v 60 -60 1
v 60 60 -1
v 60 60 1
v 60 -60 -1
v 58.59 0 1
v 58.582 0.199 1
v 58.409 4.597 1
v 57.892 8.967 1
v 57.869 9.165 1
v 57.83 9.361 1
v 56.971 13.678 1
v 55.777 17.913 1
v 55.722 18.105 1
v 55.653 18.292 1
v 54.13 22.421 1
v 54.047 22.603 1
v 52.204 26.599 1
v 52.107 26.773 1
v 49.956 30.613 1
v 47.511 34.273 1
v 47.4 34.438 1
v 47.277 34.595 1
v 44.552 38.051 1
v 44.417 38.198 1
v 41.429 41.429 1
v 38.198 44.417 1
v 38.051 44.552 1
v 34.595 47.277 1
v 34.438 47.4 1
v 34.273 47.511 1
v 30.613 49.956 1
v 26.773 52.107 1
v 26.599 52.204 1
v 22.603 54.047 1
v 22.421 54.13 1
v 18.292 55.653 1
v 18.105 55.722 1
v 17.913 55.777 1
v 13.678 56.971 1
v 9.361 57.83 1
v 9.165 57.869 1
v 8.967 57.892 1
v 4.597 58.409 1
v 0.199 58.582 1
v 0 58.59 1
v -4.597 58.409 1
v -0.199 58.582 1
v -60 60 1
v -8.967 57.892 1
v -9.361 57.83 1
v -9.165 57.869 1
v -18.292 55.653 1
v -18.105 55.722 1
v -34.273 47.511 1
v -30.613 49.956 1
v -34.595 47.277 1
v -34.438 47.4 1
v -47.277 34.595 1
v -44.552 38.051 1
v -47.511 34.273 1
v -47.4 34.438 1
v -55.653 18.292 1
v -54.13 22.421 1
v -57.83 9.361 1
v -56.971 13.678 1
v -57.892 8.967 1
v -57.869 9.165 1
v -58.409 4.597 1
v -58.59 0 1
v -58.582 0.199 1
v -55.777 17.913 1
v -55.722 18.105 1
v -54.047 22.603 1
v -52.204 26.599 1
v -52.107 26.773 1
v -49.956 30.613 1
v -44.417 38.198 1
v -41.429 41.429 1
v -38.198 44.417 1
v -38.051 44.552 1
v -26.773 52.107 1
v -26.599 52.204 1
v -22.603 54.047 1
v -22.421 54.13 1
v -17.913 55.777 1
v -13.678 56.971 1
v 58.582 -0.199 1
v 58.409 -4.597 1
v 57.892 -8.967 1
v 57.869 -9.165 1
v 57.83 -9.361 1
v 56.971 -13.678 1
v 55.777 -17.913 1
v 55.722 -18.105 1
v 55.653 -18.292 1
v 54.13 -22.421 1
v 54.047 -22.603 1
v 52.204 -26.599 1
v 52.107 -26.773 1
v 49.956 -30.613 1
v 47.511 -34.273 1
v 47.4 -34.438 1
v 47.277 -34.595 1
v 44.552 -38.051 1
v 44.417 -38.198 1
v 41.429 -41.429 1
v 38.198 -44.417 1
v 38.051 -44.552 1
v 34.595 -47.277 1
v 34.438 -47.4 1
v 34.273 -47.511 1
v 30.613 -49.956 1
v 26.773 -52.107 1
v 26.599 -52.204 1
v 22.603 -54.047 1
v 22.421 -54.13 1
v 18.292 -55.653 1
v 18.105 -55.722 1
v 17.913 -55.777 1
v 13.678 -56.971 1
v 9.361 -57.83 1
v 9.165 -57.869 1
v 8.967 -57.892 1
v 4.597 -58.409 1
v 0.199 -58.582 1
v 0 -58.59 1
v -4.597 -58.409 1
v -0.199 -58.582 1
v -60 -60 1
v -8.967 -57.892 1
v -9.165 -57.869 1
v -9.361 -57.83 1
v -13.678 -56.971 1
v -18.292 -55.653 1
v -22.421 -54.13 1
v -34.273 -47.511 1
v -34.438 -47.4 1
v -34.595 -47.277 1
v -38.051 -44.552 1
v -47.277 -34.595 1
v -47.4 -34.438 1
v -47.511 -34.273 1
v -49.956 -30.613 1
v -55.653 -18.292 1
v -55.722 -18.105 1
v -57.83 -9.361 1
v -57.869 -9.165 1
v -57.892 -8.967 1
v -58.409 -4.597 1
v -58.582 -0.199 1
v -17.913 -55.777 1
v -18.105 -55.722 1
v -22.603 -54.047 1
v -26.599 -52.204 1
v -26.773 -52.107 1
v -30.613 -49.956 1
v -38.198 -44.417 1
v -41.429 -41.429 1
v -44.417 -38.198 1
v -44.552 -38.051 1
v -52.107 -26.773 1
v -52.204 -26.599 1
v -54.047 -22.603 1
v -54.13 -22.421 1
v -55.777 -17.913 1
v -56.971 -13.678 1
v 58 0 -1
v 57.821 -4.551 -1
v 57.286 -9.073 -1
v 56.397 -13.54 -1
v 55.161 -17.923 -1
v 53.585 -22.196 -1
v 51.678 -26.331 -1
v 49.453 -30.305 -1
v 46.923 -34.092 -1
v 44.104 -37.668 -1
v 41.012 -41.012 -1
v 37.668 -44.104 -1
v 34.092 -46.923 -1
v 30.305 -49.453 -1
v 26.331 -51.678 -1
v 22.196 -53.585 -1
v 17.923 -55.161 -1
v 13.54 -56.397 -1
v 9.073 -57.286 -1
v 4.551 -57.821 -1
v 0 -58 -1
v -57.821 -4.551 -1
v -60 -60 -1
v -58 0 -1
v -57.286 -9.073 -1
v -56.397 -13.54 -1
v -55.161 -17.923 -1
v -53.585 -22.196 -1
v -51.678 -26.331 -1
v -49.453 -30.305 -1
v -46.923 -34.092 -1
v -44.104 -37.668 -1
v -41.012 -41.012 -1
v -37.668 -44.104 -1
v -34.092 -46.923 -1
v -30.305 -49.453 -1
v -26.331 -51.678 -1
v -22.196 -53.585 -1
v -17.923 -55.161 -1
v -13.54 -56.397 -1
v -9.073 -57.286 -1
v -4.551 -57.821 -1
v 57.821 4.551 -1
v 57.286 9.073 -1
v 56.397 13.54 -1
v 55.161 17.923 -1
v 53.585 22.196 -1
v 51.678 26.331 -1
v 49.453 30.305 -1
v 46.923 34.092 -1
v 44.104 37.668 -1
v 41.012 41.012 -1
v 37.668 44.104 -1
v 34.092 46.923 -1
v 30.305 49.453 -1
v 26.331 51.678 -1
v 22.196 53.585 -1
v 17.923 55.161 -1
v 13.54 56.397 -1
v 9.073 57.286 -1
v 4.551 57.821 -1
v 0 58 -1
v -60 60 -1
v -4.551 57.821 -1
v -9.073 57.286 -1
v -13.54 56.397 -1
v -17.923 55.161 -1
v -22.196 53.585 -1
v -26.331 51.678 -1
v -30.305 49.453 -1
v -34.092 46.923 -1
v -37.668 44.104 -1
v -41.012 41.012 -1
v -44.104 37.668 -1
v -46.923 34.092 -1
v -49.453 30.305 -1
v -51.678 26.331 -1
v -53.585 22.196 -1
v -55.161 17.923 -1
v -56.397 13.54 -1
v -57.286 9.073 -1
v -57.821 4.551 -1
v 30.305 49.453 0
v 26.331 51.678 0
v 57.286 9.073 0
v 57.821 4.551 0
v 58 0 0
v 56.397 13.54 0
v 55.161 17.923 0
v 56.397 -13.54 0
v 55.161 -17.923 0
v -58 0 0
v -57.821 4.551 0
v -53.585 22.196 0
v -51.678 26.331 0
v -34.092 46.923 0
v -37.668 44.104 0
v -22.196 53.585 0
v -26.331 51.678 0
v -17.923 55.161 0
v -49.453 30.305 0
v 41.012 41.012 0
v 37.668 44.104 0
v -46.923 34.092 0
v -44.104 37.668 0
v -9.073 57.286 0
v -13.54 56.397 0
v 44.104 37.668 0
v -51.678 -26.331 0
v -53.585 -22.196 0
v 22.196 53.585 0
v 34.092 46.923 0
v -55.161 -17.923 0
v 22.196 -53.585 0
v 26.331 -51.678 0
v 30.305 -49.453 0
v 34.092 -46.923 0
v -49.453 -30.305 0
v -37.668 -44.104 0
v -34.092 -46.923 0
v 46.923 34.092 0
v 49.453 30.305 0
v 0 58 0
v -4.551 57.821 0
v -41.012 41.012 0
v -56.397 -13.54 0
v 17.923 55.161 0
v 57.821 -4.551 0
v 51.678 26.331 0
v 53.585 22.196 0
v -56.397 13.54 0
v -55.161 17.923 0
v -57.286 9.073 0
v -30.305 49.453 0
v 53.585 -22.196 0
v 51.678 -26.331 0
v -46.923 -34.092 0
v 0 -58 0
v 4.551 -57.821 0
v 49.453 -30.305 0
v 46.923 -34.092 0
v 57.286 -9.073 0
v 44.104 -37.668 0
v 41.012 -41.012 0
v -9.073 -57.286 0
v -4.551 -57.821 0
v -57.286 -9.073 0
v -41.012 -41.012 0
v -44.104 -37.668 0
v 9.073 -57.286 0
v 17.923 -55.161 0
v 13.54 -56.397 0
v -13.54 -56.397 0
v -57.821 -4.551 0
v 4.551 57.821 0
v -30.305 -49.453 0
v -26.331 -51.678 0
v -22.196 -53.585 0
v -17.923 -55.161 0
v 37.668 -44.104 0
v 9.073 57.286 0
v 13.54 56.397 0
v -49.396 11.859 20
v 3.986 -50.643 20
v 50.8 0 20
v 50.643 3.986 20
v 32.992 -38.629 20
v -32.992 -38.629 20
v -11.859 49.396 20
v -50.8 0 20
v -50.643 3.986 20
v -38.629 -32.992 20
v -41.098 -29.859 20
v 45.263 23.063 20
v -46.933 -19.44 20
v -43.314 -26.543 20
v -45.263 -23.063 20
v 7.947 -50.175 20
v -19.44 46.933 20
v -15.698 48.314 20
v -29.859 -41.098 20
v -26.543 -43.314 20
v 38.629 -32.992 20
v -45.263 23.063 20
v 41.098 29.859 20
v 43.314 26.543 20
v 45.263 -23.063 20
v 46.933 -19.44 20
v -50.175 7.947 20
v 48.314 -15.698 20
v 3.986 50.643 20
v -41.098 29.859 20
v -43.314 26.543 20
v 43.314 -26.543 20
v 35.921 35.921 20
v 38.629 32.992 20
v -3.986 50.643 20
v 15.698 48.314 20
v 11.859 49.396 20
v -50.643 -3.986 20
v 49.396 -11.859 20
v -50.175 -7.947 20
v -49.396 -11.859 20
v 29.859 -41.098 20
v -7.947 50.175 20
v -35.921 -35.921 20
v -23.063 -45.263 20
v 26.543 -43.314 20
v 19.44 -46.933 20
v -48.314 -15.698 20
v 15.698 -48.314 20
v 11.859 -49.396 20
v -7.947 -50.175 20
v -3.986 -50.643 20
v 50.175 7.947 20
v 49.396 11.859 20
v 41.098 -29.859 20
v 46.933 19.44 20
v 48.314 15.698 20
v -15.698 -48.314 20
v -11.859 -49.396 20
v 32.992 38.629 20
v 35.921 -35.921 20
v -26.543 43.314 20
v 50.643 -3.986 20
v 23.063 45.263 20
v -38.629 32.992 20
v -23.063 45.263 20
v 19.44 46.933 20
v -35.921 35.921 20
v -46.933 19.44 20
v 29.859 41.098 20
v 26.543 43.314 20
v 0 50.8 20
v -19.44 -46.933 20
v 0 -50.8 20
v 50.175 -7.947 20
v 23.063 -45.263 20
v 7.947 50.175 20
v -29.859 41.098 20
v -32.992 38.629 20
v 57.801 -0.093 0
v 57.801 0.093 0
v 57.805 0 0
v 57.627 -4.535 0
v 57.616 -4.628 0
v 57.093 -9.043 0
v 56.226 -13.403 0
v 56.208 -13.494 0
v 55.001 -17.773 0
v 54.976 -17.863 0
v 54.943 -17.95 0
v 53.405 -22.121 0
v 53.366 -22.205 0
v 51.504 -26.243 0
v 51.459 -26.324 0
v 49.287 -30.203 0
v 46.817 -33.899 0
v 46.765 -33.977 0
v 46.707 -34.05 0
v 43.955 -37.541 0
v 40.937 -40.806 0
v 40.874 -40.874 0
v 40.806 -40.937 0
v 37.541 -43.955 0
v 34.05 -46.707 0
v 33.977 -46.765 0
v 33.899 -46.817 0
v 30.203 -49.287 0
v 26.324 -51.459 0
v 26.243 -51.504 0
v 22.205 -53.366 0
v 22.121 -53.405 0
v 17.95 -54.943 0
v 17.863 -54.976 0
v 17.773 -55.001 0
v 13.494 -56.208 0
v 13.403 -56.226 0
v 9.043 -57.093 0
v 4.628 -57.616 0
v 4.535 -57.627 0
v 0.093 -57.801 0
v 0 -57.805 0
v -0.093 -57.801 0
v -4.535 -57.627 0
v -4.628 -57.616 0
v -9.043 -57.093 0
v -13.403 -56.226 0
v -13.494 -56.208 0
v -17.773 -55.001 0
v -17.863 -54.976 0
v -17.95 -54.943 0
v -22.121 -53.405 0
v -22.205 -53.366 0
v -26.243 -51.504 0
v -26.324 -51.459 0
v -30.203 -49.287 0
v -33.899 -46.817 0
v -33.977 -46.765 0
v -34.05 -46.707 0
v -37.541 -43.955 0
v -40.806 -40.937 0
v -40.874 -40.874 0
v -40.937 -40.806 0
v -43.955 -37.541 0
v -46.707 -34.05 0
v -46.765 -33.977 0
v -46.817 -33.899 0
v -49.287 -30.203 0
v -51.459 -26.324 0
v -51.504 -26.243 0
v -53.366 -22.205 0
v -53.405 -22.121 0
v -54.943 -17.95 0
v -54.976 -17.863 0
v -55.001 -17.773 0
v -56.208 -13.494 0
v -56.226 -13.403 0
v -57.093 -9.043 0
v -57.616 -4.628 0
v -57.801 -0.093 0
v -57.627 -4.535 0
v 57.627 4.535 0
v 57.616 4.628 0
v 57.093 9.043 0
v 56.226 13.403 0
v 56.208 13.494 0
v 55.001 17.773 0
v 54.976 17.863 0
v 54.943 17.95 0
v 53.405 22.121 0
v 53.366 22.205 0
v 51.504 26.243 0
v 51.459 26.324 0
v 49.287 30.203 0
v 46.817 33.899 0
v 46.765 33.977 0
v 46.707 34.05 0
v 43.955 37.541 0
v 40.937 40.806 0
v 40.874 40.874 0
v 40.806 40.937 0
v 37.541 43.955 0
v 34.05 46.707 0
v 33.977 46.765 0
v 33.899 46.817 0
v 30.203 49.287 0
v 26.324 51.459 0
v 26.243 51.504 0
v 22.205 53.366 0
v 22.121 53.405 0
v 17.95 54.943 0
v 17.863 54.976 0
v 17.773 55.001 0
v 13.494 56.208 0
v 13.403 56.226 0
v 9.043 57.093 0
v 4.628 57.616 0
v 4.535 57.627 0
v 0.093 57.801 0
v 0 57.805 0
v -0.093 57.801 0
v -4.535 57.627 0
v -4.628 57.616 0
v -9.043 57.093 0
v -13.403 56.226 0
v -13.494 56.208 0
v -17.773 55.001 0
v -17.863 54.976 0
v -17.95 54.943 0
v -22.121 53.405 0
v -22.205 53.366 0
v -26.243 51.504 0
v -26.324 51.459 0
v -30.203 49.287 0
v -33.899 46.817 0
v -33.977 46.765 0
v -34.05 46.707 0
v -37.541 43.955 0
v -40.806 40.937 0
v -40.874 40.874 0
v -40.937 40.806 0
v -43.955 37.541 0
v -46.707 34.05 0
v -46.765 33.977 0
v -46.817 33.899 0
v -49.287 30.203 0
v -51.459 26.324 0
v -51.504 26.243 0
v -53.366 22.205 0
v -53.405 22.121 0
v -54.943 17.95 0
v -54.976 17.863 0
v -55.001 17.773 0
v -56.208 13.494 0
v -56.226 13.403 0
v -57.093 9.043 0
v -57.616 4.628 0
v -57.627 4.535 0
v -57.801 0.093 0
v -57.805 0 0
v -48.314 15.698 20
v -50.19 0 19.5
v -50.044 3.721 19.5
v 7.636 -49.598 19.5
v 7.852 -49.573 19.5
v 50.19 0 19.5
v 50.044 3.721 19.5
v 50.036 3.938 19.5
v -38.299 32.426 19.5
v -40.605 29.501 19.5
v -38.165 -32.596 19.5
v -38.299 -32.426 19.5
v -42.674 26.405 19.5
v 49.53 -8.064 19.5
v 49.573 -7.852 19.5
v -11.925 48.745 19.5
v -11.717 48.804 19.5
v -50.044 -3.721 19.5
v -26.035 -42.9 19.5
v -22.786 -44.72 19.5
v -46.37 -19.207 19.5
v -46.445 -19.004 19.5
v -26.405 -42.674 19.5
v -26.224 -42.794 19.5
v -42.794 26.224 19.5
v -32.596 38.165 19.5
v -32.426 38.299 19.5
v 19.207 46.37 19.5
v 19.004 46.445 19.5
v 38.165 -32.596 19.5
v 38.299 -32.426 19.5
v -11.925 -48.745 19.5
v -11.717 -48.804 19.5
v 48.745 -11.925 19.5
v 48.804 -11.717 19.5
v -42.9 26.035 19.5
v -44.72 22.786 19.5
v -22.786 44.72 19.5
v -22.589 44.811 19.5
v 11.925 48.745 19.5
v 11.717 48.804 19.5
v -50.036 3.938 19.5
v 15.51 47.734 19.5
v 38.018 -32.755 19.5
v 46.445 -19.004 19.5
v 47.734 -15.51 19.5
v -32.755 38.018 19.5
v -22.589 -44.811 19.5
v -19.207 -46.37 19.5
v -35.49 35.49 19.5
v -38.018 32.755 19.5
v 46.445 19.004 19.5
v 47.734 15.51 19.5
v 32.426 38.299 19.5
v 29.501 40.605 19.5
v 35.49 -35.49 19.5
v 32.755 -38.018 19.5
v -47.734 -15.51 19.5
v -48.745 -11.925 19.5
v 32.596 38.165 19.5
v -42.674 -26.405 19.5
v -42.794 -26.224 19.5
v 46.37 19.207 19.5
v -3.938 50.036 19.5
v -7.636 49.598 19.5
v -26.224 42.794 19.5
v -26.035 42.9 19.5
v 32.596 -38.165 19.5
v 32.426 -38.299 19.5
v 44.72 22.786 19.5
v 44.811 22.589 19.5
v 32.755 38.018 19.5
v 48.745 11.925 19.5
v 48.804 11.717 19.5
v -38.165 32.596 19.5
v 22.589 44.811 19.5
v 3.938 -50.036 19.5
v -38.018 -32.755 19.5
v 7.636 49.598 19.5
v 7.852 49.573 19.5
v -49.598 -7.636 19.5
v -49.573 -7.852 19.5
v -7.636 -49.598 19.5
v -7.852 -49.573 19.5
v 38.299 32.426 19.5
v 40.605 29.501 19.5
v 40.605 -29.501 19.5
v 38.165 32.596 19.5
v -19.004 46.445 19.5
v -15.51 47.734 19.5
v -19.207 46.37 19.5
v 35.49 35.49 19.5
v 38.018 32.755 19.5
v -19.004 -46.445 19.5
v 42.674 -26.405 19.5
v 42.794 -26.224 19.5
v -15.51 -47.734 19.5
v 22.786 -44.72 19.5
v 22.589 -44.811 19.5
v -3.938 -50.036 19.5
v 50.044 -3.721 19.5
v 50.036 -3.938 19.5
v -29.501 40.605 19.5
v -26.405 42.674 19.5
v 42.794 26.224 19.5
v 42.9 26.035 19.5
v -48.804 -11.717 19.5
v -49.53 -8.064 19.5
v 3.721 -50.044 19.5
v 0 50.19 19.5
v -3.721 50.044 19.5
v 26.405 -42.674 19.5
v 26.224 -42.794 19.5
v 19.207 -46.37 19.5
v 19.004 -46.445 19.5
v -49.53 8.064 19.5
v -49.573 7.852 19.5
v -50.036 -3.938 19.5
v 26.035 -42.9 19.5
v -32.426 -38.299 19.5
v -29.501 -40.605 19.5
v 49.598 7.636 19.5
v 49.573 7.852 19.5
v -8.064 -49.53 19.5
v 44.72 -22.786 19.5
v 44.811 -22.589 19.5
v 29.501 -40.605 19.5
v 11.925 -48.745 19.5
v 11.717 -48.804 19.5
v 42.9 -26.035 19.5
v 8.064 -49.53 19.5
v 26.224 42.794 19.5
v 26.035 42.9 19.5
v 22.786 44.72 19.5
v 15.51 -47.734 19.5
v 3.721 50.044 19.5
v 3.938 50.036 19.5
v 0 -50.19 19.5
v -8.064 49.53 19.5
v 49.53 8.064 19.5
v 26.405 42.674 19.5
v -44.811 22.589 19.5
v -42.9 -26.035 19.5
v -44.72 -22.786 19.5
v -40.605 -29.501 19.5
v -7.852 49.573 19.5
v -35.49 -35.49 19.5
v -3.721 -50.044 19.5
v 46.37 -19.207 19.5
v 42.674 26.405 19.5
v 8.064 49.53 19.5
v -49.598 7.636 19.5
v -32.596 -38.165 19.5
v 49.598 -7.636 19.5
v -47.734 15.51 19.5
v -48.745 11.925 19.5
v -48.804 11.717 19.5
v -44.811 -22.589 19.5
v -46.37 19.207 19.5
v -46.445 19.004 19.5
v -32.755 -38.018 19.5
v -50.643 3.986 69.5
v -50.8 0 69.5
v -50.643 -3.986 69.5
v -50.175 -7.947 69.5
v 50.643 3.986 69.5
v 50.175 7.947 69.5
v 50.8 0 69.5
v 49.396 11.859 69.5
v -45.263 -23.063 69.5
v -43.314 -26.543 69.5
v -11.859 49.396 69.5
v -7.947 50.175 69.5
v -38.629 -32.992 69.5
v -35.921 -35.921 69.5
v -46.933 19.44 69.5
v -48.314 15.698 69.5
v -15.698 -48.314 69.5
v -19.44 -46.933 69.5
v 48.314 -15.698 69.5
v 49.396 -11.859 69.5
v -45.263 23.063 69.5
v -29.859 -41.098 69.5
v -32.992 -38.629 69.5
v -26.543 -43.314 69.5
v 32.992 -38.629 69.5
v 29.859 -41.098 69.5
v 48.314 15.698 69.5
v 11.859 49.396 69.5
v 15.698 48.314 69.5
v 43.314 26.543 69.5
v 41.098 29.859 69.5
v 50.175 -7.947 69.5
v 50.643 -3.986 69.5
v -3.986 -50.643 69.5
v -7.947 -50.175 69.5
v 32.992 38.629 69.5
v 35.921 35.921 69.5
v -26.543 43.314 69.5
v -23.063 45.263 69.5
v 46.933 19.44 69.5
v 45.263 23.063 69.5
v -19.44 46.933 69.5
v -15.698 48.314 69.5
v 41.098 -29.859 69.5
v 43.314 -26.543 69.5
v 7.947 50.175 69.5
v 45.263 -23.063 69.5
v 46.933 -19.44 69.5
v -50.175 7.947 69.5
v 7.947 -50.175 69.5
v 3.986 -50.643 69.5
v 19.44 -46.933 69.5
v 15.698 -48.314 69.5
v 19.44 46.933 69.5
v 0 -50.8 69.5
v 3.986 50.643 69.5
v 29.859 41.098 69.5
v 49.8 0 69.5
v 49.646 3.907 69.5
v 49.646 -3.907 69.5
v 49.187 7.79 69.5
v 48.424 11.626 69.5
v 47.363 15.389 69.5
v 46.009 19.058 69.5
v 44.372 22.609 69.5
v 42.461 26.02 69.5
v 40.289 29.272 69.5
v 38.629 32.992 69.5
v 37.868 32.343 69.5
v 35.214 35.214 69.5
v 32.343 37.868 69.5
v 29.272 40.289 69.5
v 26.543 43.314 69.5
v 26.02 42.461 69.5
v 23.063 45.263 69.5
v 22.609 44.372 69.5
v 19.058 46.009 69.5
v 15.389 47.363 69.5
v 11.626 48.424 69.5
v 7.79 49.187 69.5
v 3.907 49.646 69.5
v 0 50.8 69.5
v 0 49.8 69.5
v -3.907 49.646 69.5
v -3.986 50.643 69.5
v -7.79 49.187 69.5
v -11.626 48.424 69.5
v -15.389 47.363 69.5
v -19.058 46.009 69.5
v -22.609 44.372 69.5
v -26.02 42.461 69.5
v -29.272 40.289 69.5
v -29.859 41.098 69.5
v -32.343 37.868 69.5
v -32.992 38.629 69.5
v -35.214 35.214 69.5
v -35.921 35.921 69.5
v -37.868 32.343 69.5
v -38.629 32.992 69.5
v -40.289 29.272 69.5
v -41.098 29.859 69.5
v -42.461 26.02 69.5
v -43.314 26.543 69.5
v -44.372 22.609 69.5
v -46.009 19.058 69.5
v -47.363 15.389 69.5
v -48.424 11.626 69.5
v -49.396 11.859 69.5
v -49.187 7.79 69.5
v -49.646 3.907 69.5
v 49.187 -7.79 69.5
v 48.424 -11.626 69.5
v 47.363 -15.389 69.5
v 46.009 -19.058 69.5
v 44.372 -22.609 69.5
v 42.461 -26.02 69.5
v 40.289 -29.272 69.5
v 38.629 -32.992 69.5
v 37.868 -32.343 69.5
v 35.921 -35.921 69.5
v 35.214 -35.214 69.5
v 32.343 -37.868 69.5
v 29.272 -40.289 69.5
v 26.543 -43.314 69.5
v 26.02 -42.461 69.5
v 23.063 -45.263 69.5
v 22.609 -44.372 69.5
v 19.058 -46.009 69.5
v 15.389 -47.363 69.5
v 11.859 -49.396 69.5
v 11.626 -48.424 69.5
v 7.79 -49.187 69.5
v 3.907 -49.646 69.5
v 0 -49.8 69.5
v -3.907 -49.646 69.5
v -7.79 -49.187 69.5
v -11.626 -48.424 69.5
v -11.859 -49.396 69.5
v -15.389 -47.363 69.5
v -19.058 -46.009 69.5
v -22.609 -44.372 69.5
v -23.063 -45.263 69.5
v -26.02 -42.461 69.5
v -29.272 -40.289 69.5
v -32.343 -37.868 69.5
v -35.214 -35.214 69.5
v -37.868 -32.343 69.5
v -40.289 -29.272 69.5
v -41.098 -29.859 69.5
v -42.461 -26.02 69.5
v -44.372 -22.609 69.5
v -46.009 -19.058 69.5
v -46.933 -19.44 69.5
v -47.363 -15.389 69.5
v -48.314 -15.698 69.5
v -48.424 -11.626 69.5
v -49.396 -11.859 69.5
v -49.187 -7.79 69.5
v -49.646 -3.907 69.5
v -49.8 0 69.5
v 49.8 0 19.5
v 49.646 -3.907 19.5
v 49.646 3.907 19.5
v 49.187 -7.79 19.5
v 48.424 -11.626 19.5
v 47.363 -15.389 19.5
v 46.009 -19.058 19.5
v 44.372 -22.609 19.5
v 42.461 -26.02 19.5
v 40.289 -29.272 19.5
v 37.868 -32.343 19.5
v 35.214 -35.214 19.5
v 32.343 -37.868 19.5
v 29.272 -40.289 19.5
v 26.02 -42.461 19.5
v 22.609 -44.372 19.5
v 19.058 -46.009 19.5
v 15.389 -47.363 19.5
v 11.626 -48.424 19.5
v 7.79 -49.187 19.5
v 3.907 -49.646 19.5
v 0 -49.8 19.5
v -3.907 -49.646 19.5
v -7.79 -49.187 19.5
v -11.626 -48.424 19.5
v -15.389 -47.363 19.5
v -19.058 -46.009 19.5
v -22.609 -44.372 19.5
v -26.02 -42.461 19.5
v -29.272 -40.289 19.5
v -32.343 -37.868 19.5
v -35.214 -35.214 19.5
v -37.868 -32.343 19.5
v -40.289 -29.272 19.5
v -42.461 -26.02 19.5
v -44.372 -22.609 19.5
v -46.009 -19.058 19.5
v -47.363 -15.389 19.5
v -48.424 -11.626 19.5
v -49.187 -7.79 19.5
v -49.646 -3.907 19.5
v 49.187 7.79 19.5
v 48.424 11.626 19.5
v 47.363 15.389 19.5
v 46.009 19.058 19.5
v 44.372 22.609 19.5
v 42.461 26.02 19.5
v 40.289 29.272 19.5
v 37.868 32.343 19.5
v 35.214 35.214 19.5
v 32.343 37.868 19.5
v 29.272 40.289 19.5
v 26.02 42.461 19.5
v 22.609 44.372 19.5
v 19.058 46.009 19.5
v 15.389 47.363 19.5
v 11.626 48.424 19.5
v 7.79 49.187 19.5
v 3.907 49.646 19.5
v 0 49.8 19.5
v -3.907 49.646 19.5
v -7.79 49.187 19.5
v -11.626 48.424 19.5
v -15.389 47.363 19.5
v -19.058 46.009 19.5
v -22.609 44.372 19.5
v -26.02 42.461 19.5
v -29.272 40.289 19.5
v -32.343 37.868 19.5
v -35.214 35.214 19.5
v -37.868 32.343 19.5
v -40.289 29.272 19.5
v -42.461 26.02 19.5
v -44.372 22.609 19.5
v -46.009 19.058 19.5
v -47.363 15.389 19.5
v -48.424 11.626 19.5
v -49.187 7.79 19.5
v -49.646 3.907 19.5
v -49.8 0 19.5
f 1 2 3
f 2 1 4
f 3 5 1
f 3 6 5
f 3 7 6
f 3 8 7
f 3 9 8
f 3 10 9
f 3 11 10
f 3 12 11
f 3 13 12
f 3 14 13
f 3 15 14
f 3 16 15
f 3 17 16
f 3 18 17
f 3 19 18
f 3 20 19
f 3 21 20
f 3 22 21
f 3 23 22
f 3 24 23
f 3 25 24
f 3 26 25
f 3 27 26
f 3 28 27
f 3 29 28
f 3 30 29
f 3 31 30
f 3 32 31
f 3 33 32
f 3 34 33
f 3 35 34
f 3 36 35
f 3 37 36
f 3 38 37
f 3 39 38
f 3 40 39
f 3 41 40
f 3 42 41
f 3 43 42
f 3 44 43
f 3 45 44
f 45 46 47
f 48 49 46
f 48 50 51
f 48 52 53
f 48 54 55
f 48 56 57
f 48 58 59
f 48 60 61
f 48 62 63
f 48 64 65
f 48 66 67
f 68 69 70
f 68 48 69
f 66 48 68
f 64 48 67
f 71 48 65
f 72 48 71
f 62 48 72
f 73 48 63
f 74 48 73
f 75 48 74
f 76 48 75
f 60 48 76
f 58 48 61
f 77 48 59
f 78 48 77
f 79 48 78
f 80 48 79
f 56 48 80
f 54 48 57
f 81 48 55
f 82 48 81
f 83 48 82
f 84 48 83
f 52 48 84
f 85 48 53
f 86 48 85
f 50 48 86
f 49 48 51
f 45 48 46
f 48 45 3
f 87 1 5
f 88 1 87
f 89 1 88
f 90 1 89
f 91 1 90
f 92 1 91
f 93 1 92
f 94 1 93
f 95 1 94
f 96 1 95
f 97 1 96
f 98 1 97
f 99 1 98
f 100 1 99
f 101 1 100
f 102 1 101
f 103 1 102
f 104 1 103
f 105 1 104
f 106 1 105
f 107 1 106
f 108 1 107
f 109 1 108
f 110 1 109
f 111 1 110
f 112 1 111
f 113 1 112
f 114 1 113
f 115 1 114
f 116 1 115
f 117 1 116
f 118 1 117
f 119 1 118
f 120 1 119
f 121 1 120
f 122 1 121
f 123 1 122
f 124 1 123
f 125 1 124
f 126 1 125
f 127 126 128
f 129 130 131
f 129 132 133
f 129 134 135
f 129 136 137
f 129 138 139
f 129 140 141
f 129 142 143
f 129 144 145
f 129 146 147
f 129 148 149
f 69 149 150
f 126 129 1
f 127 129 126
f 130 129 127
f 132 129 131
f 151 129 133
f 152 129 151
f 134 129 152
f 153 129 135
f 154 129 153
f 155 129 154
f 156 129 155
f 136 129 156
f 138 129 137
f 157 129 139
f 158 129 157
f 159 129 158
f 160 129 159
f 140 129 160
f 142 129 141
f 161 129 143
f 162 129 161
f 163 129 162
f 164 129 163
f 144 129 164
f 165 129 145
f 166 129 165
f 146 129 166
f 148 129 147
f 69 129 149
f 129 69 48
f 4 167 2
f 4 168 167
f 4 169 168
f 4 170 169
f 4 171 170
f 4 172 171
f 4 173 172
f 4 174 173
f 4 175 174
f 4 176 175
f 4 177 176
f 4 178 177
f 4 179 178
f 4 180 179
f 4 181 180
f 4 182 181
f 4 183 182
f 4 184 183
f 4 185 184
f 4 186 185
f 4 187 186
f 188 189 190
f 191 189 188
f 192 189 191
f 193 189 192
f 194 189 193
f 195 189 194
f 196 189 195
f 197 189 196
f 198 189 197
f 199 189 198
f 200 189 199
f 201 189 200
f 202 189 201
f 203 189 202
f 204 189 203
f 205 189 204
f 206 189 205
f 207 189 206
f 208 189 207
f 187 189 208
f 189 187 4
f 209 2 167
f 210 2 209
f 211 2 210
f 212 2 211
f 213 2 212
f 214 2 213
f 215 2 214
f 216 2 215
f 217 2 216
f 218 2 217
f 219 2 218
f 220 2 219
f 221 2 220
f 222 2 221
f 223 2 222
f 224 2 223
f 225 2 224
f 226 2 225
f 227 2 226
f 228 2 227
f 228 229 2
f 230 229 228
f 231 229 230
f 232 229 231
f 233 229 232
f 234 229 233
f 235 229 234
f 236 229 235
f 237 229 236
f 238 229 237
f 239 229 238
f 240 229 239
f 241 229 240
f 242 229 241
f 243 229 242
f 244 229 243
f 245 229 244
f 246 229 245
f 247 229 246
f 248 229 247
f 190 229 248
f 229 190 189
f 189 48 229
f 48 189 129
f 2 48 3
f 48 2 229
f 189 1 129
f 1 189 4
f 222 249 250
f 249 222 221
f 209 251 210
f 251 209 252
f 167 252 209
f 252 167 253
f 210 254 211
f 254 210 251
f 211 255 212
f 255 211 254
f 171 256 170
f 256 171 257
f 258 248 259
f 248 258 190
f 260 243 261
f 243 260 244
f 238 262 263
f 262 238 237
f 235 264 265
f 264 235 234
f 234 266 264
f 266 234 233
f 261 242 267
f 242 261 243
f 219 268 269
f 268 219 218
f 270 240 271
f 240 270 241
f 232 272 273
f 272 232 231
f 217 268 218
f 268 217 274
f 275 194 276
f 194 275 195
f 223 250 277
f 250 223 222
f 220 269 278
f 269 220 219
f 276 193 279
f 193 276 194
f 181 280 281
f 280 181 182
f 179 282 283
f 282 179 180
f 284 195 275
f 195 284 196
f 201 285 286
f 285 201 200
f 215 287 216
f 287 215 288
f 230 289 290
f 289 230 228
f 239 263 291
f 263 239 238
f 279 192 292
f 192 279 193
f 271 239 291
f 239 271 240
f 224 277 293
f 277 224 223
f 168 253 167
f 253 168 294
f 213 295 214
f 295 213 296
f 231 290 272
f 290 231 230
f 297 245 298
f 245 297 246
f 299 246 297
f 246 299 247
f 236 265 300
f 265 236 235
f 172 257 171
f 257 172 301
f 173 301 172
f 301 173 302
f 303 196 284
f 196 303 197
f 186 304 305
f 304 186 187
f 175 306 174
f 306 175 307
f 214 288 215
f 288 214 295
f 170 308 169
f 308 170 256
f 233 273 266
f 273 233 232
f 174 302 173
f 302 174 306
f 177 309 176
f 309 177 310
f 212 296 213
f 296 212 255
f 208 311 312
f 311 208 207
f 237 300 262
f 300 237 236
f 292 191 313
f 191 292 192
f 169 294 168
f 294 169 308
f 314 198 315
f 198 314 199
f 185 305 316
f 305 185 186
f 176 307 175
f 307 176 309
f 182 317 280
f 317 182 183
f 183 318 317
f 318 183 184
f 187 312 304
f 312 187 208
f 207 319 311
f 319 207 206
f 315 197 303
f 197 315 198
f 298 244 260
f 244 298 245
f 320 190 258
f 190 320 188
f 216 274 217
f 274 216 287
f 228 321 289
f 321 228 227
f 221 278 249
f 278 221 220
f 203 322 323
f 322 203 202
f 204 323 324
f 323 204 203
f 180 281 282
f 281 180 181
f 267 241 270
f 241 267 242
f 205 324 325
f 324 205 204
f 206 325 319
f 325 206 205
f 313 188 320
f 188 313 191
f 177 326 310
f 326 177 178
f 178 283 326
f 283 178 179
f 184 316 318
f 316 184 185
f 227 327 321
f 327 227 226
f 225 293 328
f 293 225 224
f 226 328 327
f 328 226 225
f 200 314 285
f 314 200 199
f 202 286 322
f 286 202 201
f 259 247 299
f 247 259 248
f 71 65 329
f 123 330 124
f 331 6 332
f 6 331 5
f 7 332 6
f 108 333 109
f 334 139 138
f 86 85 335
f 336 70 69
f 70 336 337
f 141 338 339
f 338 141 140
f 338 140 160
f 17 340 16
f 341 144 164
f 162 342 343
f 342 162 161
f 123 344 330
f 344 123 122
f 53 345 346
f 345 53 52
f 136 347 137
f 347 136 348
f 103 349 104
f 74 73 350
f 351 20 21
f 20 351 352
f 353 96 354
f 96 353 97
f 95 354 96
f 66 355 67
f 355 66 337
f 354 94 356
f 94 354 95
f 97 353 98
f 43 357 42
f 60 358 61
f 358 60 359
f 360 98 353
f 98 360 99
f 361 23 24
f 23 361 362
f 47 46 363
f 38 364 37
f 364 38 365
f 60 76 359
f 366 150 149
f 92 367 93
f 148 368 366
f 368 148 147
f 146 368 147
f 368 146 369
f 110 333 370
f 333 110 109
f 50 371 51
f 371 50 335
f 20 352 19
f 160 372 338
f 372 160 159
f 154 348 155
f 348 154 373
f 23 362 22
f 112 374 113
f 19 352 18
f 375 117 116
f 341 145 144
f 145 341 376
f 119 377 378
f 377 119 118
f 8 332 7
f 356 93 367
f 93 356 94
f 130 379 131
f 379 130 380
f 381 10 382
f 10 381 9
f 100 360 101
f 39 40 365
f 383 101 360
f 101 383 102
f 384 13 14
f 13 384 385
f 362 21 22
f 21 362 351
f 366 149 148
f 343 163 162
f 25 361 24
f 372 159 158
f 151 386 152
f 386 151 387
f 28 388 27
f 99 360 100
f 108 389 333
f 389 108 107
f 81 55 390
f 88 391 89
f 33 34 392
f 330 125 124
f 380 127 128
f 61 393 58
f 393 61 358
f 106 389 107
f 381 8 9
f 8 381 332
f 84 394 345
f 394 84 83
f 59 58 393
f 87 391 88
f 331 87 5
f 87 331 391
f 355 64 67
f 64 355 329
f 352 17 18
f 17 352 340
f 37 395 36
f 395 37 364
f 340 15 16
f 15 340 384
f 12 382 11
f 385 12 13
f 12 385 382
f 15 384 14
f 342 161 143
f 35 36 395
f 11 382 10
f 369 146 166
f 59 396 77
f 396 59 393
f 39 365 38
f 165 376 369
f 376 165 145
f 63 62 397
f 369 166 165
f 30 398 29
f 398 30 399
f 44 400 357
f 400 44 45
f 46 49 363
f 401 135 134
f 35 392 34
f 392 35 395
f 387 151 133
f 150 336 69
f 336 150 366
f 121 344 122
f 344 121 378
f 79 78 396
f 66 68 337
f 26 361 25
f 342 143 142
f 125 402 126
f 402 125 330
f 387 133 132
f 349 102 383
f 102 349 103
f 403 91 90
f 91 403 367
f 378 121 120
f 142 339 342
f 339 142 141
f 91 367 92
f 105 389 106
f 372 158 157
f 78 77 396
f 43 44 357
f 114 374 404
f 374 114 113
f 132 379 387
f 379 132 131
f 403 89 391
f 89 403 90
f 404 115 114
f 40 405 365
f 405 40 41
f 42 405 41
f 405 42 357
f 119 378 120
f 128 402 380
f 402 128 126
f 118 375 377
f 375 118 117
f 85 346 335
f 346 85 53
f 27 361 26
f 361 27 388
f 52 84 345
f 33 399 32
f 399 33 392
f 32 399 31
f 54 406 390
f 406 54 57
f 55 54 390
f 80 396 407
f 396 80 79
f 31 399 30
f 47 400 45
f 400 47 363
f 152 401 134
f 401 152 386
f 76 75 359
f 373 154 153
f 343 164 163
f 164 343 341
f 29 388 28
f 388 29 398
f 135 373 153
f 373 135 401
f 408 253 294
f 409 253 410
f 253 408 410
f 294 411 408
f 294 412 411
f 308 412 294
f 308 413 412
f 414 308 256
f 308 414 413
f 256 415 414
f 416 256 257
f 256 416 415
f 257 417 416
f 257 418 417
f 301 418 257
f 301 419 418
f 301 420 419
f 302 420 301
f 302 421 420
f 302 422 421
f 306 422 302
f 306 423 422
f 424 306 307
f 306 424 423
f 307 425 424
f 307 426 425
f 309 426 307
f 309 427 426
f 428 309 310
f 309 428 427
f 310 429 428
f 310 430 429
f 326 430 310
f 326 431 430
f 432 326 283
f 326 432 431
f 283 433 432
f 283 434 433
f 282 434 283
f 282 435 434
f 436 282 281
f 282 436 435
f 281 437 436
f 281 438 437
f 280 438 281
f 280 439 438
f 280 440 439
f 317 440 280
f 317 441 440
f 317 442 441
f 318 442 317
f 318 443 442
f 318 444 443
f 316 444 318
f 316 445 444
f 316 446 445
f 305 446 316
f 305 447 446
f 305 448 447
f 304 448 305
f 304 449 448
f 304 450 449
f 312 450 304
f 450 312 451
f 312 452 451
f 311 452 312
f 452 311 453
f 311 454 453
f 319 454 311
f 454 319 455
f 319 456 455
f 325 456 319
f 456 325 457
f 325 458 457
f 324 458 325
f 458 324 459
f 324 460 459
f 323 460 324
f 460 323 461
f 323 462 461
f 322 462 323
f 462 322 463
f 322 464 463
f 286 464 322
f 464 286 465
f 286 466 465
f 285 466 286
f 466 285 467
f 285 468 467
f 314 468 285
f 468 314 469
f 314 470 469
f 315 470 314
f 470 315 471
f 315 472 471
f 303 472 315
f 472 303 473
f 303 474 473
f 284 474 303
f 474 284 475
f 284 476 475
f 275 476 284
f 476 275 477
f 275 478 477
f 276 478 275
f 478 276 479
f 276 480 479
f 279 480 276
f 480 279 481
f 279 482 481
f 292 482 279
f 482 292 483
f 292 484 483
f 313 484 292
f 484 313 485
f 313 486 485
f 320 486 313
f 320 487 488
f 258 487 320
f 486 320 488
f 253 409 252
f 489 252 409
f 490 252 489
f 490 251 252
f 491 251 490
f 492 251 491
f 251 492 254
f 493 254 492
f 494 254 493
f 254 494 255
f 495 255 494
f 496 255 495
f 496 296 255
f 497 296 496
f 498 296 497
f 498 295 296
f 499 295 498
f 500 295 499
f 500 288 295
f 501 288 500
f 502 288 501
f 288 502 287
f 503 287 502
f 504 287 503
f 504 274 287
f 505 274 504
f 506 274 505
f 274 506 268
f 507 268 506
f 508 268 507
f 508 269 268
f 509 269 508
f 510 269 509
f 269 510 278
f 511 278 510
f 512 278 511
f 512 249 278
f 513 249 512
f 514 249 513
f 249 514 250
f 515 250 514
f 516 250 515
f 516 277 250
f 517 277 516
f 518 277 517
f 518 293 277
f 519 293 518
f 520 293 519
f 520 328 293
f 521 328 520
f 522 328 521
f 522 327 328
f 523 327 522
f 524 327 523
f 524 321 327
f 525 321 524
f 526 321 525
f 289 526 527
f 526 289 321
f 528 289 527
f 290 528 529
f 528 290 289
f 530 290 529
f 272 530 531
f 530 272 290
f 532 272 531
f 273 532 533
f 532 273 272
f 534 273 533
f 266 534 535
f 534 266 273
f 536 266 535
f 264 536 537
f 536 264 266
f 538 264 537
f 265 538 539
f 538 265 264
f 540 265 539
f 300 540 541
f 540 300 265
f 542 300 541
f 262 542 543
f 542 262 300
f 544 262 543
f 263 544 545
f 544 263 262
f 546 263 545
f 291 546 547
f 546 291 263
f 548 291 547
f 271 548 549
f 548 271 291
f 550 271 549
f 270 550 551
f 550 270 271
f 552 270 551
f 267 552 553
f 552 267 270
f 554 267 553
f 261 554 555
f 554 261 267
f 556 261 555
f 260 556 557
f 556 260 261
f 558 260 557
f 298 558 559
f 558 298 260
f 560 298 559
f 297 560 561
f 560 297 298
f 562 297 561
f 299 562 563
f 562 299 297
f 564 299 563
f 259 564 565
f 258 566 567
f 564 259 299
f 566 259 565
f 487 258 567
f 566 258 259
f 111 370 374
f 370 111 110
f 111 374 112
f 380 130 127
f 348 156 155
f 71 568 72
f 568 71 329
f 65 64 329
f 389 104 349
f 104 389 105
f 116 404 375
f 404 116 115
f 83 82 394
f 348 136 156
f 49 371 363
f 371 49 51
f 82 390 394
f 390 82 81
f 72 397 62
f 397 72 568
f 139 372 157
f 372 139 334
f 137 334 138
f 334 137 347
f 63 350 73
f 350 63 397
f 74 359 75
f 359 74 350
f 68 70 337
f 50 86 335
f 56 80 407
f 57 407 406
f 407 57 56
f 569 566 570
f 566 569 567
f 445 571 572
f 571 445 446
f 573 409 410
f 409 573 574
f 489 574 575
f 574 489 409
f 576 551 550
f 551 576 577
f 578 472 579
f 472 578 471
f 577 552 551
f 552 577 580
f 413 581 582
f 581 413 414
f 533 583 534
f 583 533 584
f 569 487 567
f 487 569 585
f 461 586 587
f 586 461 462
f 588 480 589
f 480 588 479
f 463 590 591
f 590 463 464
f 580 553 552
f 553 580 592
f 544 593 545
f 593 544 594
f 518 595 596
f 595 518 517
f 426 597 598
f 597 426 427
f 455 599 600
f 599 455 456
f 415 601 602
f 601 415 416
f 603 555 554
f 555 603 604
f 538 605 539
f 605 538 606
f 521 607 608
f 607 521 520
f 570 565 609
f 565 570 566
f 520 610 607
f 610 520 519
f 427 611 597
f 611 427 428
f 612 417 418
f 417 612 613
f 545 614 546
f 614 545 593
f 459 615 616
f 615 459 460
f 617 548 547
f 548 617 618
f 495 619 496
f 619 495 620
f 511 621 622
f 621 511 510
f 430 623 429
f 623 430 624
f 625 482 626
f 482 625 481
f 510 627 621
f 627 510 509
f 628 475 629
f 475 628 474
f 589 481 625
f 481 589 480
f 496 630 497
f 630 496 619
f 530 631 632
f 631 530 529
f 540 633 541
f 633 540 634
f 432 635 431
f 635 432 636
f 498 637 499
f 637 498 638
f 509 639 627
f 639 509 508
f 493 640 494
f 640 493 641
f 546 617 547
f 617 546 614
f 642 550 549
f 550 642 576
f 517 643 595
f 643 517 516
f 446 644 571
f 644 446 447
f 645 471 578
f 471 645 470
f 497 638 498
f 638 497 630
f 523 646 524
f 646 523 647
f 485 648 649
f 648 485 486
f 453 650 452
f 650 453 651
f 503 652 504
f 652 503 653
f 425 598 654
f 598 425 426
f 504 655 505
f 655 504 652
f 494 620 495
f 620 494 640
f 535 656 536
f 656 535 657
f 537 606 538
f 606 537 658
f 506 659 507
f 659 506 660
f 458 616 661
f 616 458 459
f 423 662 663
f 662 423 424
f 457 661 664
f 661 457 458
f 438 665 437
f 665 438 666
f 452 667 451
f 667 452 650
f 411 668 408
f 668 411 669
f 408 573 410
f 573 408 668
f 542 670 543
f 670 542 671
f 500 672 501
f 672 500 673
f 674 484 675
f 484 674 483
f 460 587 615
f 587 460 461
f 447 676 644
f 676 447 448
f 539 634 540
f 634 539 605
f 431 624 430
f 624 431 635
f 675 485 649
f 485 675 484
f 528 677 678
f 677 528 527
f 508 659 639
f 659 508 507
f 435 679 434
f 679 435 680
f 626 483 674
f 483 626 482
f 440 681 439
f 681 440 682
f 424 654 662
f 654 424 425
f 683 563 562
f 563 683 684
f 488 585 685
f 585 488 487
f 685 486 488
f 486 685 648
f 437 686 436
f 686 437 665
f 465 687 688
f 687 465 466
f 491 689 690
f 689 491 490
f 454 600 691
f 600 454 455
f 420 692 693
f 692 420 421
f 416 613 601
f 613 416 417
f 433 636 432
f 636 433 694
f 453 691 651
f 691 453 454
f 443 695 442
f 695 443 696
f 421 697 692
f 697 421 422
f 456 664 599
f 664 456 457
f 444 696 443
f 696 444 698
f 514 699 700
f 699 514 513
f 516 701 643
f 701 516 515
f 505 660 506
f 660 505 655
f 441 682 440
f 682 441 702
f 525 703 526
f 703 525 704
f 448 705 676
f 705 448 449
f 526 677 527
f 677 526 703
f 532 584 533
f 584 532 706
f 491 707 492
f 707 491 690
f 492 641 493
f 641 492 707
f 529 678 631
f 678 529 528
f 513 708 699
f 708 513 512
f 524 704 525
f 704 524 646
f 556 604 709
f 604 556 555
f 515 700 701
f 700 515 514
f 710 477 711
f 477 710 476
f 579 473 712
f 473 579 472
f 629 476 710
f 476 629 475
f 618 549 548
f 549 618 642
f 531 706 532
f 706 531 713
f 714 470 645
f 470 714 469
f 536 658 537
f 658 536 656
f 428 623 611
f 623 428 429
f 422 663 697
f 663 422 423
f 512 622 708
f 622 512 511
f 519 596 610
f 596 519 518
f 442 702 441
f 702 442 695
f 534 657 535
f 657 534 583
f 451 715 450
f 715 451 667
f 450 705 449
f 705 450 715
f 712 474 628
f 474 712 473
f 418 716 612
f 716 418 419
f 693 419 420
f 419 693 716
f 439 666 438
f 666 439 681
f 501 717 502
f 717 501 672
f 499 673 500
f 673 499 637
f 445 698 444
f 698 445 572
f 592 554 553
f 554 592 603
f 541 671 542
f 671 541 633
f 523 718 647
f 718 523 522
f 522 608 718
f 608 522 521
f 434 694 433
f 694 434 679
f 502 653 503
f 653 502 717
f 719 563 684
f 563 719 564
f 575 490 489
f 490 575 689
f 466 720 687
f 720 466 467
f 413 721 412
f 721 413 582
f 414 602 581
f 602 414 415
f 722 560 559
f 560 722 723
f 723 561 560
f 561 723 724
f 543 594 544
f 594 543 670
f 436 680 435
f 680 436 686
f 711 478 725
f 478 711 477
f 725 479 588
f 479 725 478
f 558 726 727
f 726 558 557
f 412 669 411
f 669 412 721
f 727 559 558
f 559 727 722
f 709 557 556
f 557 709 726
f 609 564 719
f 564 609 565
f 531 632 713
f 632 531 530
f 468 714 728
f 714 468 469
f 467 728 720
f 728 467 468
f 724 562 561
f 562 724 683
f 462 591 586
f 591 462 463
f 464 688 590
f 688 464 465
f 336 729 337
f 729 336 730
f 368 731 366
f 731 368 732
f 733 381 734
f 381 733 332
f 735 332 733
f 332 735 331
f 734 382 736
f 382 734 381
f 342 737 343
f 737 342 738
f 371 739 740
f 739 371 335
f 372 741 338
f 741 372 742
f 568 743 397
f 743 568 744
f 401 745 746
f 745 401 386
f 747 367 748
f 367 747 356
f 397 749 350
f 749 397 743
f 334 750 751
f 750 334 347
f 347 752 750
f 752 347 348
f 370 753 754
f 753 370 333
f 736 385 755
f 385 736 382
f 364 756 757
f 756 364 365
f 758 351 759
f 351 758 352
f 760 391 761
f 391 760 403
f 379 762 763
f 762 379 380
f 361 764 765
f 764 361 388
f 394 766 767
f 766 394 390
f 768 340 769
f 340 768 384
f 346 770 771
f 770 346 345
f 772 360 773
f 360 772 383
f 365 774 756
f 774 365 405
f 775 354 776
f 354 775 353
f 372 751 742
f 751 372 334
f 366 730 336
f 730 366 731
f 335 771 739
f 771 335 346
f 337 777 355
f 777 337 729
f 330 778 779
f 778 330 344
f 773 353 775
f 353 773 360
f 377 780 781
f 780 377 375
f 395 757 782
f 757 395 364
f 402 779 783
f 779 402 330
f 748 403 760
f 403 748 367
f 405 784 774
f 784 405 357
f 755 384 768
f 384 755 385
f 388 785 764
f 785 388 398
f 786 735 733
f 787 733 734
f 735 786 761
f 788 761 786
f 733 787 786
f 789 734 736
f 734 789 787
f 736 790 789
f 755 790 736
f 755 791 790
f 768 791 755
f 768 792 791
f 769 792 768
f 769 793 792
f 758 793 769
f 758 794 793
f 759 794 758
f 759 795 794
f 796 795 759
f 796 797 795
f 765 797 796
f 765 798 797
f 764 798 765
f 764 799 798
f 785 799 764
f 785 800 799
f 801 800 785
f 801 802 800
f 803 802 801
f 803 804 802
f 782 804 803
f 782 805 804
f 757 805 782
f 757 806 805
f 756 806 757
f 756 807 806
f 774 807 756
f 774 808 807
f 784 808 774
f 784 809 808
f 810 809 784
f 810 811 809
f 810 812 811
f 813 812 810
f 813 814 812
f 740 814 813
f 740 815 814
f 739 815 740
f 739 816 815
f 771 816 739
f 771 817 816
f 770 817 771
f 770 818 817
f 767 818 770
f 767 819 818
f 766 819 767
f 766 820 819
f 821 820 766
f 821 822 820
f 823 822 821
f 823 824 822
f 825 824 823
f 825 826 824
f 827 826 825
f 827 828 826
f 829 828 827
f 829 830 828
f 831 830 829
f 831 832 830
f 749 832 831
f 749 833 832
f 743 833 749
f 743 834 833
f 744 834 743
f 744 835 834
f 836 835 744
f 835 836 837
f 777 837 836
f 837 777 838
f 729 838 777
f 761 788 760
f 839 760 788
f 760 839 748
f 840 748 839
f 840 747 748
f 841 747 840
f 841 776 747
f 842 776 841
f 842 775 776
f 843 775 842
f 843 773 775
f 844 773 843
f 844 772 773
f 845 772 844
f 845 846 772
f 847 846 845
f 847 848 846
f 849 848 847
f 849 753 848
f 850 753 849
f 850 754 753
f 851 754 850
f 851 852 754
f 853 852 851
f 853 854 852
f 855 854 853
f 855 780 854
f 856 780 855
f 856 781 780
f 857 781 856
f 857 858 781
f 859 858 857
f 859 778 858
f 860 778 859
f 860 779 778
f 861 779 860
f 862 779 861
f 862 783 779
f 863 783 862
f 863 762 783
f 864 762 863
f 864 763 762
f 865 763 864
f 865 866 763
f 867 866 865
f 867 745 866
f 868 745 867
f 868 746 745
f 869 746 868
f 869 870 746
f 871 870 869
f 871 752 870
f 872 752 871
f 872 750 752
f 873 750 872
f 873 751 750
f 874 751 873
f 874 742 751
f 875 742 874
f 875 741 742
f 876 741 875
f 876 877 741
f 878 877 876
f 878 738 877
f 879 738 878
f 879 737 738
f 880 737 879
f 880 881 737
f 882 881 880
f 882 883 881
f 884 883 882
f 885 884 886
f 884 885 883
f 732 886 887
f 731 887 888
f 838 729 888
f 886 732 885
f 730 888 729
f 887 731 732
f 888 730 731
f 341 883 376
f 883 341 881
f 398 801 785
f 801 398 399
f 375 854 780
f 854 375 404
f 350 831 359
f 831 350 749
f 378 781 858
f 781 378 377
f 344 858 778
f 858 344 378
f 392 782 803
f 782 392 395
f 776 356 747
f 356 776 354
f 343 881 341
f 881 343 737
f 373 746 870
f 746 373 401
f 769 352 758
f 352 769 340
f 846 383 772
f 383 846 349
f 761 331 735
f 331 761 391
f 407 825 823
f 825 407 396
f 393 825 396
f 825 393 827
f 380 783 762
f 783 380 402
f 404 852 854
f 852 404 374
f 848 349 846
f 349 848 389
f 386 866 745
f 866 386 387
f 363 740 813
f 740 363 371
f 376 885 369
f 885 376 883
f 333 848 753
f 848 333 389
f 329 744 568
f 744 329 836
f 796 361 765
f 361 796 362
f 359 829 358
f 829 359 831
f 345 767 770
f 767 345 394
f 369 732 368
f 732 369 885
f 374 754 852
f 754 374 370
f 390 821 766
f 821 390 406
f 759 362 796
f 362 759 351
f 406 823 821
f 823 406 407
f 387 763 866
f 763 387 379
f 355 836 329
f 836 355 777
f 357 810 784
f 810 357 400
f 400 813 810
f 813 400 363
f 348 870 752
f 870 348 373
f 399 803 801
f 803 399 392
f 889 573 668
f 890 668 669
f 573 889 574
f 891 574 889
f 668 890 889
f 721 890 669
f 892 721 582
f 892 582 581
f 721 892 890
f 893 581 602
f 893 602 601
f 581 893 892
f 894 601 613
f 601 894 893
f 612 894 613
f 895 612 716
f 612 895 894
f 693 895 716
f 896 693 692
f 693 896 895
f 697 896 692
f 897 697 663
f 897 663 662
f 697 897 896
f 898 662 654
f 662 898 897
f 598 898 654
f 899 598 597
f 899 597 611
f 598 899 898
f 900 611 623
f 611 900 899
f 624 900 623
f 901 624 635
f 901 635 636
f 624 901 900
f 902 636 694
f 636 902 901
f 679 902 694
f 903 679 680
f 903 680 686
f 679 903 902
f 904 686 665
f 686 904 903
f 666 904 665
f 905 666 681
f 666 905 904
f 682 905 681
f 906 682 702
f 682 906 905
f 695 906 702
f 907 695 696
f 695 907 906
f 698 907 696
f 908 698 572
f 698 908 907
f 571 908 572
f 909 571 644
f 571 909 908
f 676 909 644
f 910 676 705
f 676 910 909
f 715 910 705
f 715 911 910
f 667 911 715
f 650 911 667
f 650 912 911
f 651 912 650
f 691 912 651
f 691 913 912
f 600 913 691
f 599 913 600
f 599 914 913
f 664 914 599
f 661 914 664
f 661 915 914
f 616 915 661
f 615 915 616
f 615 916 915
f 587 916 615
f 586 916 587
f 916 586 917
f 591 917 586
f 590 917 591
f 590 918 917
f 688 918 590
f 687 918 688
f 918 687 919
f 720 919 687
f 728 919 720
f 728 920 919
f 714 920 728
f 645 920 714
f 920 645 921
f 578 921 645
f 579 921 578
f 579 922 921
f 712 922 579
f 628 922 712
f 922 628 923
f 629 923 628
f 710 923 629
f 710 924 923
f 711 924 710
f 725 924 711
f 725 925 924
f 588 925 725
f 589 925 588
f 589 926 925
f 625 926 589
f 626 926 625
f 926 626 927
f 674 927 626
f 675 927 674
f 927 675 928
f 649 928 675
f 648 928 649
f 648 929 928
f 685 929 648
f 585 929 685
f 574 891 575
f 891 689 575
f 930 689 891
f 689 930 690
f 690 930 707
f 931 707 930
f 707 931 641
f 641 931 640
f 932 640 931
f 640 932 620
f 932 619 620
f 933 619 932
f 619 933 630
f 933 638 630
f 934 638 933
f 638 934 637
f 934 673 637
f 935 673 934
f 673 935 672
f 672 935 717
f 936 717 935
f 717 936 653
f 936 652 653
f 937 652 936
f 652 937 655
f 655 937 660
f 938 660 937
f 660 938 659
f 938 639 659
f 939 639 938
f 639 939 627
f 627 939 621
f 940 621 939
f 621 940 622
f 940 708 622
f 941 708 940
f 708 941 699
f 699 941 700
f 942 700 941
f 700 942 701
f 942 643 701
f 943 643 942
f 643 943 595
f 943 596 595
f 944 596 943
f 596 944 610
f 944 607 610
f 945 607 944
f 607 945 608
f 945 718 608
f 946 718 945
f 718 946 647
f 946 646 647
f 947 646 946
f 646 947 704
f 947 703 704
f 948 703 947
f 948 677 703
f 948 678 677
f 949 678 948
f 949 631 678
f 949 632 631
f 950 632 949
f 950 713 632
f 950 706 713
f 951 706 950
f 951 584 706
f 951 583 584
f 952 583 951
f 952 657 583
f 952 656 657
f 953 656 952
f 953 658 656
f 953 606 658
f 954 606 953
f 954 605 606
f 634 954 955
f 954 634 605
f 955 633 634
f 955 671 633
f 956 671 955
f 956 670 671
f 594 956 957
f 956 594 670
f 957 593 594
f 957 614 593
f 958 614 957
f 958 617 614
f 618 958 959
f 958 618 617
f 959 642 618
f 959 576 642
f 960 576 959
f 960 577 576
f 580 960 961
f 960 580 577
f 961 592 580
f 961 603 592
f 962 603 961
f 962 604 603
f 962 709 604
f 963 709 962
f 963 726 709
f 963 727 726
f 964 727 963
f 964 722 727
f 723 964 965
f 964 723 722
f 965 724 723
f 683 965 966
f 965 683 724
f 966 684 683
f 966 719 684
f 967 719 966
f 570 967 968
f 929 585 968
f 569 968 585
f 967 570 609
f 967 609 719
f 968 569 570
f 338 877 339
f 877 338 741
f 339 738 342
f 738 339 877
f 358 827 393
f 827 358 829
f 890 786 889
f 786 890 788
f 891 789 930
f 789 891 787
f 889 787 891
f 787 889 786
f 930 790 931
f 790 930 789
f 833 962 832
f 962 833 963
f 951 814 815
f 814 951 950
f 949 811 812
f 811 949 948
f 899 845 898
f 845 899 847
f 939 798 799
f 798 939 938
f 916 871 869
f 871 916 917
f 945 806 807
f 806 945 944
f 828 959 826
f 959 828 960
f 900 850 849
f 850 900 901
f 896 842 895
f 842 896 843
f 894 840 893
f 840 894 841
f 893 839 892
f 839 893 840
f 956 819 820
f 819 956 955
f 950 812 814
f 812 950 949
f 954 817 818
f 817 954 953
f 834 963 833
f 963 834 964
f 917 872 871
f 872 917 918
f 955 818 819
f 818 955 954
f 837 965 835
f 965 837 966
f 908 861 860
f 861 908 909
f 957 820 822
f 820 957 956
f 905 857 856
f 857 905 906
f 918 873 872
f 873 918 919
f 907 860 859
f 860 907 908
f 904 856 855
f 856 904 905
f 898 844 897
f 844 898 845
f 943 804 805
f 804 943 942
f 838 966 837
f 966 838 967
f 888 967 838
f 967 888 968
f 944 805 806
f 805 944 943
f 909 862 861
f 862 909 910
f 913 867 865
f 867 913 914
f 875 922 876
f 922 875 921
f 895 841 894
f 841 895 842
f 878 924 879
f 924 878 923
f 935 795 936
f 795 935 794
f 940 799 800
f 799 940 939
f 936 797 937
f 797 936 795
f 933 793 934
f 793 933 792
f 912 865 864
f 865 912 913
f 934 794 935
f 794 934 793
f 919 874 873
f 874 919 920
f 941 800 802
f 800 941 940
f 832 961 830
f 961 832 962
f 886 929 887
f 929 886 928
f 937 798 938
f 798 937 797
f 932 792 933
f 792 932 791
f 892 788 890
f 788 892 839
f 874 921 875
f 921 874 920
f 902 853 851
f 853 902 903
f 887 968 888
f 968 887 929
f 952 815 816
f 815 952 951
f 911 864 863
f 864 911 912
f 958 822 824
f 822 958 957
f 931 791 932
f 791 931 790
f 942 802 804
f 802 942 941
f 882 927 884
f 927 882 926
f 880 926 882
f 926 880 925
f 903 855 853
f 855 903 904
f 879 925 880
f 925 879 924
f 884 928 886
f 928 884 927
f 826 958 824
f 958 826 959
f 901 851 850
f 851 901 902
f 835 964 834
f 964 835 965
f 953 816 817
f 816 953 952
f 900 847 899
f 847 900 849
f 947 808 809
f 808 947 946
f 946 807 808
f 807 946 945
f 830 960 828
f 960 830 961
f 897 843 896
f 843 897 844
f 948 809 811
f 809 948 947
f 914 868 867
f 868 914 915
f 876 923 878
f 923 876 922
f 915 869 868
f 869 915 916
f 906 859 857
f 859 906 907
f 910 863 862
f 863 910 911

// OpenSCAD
// file: constants.scad
fan_mounting_hole_spacing = 105;
fan_mounting_hole_diameter = 4.3;  // slightly oversized for #8, will probably need drilling anyway
fan_frame_width = 120;

module frame_hole_negative(h=1000) {
    frame_hole_pattern() cylinder(d=fan_mounting_hole_diameter, h=h, center=true);
}

module frame_hole_pattern() {
    r = fan_mounting_hole_spacing / 2;
    translate([ r,  r, 0]) children();
    translate([-r,  r, 0]) children();
    translate([ r, -r, 0]) children();
    translate([-r, -r, 0]) children();
}
// main file
include <constants.scad>;

frame_thick = 2;
tube_thick = 2;
fan_hole = fan_frame_width - 4;
duct_width = 25.4 * 4;
transition = 20;
duct_end = 50;
epsilon = 0.5;

$fn = 80;

intersection() {
    difference() {
        cube([fan_frame_width, fan_frame_width, frame_thick], center=true);
        cylinder(d=fan_hole, h=frame_thick * 2, center=true);
    }
}

// transition
difference() {
    cylinder(d1=fan_hole + tube_thick, d2=duct_width, h=transition);
    translate([0, 0, -epsilon])
    cylinder(d1=fan_hole, d2=duct_width - tube_thick, h=transition + epsilon * 2);
}

// duct end
translate([0, 0, transition - epsilon])
difference() {
    cylinder(d=duct_width, h=duct_end);
    translate([0, 0, -epsilon])
    cylinder(d=duct_width - tube_thick, h=duct_end + epsilon * 2);
}
